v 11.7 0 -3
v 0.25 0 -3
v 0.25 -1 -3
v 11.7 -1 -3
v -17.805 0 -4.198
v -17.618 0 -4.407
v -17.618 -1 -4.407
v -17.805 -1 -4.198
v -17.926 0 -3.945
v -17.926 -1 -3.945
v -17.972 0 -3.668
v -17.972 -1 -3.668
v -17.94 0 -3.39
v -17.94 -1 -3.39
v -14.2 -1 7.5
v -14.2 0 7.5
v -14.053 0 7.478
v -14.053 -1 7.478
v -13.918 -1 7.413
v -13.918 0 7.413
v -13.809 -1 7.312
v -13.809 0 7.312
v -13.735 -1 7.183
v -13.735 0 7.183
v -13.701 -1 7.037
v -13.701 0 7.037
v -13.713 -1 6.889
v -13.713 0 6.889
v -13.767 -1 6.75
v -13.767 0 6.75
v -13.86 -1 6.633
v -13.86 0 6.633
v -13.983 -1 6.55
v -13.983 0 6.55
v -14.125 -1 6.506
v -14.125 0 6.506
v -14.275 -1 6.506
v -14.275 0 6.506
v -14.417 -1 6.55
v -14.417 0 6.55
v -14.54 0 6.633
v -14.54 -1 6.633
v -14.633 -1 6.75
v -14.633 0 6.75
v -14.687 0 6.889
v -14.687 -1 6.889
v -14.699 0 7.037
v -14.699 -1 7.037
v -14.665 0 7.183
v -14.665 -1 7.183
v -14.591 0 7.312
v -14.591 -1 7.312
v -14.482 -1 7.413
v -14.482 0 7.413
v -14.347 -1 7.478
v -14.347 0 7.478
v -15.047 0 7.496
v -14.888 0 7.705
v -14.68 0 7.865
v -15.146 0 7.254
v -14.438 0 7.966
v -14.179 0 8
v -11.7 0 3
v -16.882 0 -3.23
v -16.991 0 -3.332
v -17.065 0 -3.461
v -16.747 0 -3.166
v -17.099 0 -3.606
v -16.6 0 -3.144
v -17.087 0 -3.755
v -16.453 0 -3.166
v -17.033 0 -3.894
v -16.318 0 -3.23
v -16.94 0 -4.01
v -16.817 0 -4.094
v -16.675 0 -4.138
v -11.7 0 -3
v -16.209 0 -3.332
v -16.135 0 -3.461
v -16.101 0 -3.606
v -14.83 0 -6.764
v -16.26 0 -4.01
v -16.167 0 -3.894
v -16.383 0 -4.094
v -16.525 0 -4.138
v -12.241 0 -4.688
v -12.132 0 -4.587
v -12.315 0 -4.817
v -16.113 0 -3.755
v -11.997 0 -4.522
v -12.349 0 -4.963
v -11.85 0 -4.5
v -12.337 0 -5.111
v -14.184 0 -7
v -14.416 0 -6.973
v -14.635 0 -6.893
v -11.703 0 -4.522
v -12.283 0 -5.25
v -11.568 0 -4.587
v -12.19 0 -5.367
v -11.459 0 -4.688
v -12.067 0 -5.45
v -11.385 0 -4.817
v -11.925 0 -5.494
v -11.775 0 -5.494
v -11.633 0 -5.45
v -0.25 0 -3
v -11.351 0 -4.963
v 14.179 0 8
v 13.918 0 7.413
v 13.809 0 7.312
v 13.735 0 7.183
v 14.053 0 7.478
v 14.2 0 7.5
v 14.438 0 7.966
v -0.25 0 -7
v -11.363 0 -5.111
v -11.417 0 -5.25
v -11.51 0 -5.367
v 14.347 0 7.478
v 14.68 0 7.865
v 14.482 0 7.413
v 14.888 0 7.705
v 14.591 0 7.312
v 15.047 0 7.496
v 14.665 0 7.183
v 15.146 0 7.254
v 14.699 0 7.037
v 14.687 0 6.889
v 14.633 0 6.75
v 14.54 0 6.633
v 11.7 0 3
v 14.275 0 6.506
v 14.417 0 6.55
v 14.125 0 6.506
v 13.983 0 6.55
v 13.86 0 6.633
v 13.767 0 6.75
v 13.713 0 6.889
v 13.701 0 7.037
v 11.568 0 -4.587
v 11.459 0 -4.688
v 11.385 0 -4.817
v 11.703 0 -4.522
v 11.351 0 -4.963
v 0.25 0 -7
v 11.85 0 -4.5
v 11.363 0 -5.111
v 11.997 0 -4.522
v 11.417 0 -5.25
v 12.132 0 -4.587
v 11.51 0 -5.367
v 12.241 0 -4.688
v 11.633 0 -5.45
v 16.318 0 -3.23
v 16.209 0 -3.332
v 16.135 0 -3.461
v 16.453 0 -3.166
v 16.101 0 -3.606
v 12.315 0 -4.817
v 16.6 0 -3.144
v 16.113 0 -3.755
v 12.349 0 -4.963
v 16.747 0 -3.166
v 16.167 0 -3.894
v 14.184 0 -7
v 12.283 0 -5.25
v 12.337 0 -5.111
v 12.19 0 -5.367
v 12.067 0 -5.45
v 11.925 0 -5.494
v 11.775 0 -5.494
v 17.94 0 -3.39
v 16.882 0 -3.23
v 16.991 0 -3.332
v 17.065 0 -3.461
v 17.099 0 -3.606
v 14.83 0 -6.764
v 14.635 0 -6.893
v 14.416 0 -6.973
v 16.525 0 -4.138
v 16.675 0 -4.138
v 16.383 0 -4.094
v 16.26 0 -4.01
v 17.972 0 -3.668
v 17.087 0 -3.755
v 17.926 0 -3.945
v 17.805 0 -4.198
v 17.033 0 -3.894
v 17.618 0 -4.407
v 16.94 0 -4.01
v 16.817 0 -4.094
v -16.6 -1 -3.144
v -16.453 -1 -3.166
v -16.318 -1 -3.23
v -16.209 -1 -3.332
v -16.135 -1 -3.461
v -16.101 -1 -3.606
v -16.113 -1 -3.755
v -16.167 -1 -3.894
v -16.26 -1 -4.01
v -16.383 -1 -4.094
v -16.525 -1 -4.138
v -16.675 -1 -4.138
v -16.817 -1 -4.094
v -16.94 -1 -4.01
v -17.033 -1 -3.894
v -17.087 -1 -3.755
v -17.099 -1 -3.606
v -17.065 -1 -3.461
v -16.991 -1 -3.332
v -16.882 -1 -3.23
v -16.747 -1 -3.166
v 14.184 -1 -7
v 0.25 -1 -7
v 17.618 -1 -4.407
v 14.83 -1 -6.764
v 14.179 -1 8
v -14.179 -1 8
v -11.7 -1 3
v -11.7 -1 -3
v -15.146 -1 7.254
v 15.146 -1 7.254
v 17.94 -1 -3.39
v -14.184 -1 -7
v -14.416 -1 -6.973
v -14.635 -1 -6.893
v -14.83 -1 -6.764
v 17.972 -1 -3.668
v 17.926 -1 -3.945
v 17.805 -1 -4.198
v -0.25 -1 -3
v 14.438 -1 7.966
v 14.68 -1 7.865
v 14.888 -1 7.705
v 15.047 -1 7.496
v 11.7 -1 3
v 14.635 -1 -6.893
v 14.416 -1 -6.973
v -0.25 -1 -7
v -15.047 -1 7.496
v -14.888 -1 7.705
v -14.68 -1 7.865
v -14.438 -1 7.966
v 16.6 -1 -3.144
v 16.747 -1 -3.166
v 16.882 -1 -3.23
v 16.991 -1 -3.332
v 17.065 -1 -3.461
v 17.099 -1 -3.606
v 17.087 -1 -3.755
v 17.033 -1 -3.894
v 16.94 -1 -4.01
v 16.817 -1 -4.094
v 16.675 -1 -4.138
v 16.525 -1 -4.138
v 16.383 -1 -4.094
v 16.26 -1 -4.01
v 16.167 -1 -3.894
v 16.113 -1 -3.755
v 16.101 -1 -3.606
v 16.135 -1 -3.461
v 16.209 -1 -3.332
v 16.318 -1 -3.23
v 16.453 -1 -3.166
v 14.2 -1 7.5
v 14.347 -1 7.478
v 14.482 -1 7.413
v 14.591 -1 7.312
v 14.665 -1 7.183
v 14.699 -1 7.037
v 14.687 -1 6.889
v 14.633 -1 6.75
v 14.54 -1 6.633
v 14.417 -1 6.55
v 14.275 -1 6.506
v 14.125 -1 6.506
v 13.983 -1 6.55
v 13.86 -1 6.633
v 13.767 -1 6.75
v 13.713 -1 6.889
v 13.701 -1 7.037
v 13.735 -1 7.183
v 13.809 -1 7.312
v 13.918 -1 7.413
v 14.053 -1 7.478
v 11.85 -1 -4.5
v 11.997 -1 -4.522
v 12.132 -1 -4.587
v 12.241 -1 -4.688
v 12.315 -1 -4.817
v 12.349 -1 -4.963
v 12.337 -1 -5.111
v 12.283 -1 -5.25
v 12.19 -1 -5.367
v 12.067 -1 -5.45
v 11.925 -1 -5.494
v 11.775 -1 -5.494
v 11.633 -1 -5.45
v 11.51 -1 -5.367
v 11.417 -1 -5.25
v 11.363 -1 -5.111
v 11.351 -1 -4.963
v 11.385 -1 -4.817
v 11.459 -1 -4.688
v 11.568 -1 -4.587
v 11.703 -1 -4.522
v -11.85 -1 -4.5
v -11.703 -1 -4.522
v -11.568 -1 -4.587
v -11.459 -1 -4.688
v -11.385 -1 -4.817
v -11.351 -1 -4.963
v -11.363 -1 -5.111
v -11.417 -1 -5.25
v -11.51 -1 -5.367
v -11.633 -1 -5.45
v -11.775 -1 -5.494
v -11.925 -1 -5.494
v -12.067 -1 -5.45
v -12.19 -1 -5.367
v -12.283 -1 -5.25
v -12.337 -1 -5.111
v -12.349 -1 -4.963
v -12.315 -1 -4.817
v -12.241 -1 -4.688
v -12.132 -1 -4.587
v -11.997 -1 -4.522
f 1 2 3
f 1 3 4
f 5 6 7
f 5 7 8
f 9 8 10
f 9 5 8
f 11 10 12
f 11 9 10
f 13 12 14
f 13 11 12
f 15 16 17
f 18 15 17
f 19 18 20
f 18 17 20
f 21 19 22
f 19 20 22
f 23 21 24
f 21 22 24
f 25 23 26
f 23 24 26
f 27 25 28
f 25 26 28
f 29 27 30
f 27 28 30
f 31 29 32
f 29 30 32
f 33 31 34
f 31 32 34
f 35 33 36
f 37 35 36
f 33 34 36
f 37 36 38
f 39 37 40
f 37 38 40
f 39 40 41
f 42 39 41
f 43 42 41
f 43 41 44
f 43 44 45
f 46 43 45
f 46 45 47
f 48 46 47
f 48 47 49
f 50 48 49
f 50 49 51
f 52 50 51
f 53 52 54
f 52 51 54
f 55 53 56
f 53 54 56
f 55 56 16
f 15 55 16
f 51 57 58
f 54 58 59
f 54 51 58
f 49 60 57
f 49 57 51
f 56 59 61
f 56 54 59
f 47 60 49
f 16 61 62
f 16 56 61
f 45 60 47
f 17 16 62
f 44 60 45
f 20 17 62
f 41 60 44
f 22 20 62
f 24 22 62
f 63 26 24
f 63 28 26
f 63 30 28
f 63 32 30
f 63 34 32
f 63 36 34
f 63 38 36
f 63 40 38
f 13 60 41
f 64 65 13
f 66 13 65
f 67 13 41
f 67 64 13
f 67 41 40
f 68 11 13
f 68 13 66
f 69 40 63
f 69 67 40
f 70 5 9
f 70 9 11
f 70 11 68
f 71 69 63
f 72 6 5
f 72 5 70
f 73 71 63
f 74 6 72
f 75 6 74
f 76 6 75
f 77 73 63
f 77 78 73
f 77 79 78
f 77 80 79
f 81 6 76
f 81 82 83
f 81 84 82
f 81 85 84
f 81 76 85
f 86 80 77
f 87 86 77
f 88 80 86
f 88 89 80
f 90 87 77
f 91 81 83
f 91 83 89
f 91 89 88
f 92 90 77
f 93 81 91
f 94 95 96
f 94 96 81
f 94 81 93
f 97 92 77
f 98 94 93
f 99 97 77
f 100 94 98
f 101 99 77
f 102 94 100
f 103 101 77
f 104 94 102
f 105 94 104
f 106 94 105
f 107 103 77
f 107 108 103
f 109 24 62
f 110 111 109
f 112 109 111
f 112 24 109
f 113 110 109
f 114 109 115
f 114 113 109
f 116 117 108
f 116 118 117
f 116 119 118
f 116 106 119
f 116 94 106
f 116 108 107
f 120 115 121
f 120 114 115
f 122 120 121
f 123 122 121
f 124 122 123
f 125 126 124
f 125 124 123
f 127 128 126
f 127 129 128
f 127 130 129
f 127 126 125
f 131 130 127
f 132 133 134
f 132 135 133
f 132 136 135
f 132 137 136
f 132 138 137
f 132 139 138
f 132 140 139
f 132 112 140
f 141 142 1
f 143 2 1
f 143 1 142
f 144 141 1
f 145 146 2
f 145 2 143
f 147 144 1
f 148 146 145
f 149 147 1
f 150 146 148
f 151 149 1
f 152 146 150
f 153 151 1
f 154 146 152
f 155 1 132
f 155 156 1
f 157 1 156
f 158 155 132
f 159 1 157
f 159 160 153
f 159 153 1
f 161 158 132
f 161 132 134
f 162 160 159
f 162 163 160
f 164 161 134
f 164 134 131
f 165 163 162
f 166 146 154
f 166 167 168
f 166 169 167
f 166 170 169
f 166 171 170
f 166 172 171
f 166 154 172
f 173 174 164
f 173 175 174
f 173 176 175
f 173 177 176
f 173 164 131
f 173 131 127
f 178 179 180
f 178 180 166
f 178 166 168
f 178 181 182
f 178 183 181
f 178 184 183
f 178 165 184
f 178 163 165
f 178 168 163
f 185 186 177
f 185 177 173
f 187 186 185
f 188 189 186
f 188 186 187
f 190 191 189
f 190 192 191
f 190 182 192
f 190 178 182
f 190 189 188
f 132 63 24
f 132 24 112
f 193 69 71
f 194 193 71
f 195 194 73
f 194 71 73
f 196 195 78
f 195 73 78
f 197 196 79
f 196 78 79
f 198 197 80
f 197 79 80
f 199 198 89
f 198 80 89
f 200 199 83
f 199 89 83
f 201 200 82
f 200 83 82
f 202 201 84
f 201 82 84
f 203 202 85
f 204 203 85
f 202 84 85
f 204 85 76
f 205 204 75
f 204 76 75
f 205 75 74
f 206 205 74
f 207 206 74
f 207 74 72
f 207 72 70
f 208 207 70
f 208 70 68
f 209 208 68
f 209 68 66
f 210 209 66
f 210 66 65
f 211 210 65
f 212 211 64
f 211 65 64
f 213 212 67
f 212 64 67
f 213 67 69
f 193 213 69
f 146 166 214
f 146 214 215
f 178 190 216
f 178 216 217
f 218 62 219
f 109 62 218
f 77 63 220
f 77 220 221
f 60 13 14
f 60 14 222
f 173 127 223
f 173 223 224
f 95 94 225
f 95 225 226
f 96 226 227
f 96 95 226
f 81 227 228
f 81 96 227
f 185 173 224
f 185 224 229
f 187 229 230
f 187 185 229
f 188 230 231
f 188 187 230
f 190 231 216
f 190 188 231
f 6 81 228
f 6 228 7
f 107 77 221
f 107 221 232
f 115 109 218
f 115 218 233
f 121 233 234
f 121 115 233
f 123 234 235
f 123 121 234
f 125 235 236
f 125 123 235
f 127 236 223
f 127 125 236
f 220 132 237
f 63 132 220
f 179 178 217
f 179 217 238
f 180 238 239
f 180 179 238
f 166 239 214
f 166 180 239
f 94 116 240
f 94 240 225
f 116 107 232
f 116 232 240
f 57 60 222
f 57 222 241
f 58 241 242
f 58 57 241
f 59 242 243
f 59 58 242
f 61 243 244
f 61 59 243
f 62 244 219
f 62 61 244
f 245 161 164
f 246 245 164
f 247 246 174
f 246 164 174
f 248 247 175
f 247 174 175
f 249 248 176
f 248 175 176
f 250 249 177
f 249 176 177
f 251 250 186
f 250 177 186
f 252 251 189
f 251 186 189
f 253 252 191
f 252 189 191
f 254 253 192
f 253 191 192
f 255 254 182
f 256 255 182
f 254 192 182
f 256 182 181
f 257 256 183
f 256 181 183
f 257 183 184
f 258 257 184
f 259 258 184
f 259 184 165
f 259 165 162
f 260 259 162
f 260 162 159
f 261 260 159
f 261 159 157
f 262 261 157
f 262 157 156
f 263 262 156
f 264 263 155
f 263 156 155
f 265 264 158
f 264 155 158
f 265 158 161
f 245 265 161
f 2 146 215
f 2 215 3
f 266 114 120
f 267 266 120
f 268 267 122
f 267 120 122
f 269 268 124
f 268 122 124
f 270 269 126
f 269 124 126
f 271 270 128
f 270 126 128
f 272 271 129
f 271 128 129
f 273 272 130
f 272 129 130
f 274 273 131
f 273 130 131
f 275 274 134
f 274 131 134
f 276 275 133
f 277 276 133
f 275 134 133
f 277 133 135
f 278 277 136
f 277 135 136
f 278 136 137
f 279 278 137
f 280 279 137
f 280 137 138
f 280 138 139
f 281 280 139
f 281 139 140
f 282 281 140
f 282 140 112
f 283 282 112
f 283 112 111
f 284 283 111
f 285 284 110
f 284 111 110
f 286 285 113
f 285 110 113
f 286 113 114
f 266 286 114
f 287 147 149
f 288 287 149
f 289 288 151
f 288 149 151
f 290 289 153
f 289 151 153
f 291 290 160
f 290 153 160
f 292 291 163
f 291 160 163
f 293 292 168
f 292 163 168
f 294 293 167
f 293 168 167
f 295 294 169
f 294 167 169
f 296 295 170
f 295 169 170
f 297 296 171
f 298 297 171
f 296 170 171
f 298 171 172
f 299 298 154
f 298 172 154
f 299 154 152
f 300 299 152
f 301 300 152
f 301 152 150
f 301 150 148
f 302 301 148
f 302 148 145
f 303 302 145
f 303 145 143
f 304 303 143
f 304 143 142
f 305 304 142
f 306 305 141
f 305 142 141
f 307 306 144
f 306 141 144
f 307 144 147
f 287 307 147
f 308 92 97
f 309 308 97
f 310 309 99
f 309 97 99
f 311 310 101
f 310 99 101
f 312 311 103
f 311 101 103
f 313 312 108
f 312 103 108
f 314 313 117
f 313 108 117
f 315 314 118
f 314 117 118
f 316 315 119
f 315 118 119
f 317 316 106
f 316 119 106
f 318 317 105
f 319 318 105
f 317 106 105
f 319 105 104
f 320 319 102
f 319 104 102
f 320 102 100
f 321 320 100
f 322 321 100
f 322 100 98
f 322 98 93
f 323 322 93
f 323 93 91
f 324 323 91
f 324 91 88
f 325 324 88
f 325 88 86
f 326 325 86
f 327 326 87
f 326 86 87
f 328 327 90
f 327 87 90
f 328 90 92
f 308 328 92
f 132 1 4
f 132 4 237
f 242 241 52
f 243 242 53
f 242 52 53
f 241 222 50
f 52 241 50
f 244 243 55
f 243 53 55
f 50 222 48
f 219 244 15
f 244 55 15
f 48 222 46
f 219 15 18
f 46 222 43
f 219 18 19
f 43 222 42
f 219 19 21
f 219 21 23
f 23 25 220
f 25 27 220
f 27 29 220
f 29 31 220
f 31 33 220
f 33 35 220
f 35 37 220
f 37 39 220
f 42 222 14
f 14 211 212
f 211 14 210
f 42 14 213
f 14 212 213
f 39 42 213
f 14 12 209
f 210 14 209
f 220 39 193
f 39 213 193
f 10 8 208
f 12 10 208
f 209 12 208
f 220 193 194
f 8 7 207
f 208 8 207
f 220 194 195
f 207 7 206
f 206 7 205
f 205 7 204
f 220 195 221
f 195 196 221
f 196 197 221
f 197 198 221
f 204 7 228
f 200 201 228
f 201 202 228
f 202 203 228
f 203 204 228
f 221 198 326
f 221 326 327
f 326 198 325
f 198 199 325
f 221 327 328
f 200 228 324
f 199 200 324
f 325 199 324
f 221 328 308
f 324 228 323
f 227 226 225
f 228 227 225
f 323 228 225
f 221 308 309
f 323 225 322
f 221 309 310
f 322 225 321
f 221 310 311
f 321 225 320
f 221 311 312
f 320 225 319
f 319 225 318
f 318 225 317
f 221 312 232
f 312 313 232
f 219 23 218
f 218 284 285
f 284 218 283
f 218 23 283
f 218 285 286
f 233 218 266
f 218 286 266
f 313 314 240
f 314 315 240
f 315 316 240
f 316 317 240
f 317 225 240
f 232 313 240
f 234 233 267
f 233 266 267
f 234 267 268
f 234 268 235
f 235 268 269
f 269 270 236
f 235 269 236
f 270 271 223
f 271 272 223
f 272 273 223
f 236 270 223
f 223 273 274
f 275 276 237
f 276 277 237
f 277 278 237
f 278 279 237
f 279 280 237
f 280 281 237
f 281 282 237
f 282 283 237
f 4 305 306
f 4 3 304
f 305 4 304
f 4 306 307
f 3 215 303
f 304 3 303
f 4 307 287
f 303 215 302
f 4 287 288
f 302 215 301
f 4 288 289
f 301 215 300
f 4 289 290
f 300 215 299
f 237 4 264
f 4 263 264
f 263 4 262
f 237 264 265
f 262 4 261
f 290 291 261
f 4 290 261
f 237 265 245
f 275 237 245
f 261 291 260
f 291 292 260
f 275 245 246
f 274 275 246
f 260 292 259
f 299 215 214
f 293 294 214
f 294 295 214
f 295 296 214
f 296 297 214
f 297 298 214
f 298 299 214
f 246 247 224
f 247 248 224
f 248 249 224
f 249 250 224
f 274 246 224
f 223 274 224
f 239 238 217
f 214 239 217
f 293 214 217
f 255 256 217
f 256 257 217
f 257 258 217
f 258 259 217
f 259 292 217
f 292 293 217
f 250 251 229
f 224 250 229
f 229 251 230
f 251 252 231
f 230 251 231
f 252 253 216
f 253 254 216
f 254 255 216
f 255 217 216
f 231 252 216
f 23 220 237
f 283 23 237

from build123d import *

# Parameters (mm, degrees)
SKETCH1_R          = 0.5
BASE_FLANGE1_DEPTH = 1


# Sheet-metal steps are written as plain solids
with BuildPart() as part:
    # Sketch1 → Base-Flange1 (new body)
    with BuildSketch(Plane(origin=(0, 0, 0), x_dir=(1, 0, 0), z_dir=(0, 1, 0))):
        with BuildLine():
            Line((-14.178620776, -8), (14.178620776, -8))
            ThreePointArc((14.178620776, -8), (14.789399734, -7.791801152), (15.145851741, -7.253898128))
            Line((15.145851741, -7.253898128), (17.939776994, 3.389626646))
            ThreePointArc((17.939776994, 3.389626646), (17.926022481, 3.944992277), (17.618005902, 4.407318956))
            Line((17.618005902, 4.407318956), (14.829510217, 6.763794182))
            ThreePointArc((14.829510217, 6.763794182), (14.527711383, 6.939093761), (14.184050345, 7))
            Line((14.184050345, 7), (0.25, 7))
            Line((0.25, 7), (0.25, 3))
            Line((0.25, 3), (11.7, 3))
            Line((11.7, 3), (11.7, -3))
            Line((11.7, -3), (-11.7, -3))
            Line((-11.7, -3), (-11.7, 3))
            Line((-11.7, 3), (-0.25, 3))
            Line((-0.25, 3), (-0.25, 7))
            Line((-0.25, 7), (-14.184050345, 7))
            ThreePointArc((-14.184050345, 7), (-14.527711383, 6.939093761), (-14.829510217, 6.763794182))
            Line((-14.829510217, 6.763794182), (-17.618005902, 4.407318956))
            ThreePointArc((-17.618005902, 4.407318956), (-17.926022481, 3.944992277), (-17.939776994, 3.389626646))
            Line((-17.939776994, 3.389626646), (-15.145851741, -7.253898128))
            ThreePointArc((-15.145851741, -7.253898128), (-14.789399734, -7.791801152), (-14.178620776, -8))
        make_face()
        with Locations(Location((-14.2, -7, 0), (0, 0, 270))):
            Circle(SKETCH1_R, mode=Mode.SUBTRACT)
        with Locations(Location((14.2, -7, 0), (0, 0, 270))):
            Circle(SKETCH1_R, mode=Mode.SUBTRACT)
        with Locations(Location((-16.6, 3.643524774, 0), (0, 0, 270))):
            Circle(SKETCH1_R, mode=Mode.SUBTRACT)
        with Locations(Location((16.6, 3.643524774, 0), (0, 0, 270))):
            Circle(SKETCH1_R, mode=Mode.SUBTRACT)
        with Locations(Location((-11.85, 5, 0), (0, 0, 270))):
            Circle(SKETCH1_R, mode=Mode.SUBTRACT)
        with Locations(Location((11.85, 5, 0), (0, 0, 270))):
            Circle(SKETCH1_R, mode=Mode.SUBTRACT)
    extrude(amount=-BASE_FLANGE1_DEPTH)


solid = part.part
